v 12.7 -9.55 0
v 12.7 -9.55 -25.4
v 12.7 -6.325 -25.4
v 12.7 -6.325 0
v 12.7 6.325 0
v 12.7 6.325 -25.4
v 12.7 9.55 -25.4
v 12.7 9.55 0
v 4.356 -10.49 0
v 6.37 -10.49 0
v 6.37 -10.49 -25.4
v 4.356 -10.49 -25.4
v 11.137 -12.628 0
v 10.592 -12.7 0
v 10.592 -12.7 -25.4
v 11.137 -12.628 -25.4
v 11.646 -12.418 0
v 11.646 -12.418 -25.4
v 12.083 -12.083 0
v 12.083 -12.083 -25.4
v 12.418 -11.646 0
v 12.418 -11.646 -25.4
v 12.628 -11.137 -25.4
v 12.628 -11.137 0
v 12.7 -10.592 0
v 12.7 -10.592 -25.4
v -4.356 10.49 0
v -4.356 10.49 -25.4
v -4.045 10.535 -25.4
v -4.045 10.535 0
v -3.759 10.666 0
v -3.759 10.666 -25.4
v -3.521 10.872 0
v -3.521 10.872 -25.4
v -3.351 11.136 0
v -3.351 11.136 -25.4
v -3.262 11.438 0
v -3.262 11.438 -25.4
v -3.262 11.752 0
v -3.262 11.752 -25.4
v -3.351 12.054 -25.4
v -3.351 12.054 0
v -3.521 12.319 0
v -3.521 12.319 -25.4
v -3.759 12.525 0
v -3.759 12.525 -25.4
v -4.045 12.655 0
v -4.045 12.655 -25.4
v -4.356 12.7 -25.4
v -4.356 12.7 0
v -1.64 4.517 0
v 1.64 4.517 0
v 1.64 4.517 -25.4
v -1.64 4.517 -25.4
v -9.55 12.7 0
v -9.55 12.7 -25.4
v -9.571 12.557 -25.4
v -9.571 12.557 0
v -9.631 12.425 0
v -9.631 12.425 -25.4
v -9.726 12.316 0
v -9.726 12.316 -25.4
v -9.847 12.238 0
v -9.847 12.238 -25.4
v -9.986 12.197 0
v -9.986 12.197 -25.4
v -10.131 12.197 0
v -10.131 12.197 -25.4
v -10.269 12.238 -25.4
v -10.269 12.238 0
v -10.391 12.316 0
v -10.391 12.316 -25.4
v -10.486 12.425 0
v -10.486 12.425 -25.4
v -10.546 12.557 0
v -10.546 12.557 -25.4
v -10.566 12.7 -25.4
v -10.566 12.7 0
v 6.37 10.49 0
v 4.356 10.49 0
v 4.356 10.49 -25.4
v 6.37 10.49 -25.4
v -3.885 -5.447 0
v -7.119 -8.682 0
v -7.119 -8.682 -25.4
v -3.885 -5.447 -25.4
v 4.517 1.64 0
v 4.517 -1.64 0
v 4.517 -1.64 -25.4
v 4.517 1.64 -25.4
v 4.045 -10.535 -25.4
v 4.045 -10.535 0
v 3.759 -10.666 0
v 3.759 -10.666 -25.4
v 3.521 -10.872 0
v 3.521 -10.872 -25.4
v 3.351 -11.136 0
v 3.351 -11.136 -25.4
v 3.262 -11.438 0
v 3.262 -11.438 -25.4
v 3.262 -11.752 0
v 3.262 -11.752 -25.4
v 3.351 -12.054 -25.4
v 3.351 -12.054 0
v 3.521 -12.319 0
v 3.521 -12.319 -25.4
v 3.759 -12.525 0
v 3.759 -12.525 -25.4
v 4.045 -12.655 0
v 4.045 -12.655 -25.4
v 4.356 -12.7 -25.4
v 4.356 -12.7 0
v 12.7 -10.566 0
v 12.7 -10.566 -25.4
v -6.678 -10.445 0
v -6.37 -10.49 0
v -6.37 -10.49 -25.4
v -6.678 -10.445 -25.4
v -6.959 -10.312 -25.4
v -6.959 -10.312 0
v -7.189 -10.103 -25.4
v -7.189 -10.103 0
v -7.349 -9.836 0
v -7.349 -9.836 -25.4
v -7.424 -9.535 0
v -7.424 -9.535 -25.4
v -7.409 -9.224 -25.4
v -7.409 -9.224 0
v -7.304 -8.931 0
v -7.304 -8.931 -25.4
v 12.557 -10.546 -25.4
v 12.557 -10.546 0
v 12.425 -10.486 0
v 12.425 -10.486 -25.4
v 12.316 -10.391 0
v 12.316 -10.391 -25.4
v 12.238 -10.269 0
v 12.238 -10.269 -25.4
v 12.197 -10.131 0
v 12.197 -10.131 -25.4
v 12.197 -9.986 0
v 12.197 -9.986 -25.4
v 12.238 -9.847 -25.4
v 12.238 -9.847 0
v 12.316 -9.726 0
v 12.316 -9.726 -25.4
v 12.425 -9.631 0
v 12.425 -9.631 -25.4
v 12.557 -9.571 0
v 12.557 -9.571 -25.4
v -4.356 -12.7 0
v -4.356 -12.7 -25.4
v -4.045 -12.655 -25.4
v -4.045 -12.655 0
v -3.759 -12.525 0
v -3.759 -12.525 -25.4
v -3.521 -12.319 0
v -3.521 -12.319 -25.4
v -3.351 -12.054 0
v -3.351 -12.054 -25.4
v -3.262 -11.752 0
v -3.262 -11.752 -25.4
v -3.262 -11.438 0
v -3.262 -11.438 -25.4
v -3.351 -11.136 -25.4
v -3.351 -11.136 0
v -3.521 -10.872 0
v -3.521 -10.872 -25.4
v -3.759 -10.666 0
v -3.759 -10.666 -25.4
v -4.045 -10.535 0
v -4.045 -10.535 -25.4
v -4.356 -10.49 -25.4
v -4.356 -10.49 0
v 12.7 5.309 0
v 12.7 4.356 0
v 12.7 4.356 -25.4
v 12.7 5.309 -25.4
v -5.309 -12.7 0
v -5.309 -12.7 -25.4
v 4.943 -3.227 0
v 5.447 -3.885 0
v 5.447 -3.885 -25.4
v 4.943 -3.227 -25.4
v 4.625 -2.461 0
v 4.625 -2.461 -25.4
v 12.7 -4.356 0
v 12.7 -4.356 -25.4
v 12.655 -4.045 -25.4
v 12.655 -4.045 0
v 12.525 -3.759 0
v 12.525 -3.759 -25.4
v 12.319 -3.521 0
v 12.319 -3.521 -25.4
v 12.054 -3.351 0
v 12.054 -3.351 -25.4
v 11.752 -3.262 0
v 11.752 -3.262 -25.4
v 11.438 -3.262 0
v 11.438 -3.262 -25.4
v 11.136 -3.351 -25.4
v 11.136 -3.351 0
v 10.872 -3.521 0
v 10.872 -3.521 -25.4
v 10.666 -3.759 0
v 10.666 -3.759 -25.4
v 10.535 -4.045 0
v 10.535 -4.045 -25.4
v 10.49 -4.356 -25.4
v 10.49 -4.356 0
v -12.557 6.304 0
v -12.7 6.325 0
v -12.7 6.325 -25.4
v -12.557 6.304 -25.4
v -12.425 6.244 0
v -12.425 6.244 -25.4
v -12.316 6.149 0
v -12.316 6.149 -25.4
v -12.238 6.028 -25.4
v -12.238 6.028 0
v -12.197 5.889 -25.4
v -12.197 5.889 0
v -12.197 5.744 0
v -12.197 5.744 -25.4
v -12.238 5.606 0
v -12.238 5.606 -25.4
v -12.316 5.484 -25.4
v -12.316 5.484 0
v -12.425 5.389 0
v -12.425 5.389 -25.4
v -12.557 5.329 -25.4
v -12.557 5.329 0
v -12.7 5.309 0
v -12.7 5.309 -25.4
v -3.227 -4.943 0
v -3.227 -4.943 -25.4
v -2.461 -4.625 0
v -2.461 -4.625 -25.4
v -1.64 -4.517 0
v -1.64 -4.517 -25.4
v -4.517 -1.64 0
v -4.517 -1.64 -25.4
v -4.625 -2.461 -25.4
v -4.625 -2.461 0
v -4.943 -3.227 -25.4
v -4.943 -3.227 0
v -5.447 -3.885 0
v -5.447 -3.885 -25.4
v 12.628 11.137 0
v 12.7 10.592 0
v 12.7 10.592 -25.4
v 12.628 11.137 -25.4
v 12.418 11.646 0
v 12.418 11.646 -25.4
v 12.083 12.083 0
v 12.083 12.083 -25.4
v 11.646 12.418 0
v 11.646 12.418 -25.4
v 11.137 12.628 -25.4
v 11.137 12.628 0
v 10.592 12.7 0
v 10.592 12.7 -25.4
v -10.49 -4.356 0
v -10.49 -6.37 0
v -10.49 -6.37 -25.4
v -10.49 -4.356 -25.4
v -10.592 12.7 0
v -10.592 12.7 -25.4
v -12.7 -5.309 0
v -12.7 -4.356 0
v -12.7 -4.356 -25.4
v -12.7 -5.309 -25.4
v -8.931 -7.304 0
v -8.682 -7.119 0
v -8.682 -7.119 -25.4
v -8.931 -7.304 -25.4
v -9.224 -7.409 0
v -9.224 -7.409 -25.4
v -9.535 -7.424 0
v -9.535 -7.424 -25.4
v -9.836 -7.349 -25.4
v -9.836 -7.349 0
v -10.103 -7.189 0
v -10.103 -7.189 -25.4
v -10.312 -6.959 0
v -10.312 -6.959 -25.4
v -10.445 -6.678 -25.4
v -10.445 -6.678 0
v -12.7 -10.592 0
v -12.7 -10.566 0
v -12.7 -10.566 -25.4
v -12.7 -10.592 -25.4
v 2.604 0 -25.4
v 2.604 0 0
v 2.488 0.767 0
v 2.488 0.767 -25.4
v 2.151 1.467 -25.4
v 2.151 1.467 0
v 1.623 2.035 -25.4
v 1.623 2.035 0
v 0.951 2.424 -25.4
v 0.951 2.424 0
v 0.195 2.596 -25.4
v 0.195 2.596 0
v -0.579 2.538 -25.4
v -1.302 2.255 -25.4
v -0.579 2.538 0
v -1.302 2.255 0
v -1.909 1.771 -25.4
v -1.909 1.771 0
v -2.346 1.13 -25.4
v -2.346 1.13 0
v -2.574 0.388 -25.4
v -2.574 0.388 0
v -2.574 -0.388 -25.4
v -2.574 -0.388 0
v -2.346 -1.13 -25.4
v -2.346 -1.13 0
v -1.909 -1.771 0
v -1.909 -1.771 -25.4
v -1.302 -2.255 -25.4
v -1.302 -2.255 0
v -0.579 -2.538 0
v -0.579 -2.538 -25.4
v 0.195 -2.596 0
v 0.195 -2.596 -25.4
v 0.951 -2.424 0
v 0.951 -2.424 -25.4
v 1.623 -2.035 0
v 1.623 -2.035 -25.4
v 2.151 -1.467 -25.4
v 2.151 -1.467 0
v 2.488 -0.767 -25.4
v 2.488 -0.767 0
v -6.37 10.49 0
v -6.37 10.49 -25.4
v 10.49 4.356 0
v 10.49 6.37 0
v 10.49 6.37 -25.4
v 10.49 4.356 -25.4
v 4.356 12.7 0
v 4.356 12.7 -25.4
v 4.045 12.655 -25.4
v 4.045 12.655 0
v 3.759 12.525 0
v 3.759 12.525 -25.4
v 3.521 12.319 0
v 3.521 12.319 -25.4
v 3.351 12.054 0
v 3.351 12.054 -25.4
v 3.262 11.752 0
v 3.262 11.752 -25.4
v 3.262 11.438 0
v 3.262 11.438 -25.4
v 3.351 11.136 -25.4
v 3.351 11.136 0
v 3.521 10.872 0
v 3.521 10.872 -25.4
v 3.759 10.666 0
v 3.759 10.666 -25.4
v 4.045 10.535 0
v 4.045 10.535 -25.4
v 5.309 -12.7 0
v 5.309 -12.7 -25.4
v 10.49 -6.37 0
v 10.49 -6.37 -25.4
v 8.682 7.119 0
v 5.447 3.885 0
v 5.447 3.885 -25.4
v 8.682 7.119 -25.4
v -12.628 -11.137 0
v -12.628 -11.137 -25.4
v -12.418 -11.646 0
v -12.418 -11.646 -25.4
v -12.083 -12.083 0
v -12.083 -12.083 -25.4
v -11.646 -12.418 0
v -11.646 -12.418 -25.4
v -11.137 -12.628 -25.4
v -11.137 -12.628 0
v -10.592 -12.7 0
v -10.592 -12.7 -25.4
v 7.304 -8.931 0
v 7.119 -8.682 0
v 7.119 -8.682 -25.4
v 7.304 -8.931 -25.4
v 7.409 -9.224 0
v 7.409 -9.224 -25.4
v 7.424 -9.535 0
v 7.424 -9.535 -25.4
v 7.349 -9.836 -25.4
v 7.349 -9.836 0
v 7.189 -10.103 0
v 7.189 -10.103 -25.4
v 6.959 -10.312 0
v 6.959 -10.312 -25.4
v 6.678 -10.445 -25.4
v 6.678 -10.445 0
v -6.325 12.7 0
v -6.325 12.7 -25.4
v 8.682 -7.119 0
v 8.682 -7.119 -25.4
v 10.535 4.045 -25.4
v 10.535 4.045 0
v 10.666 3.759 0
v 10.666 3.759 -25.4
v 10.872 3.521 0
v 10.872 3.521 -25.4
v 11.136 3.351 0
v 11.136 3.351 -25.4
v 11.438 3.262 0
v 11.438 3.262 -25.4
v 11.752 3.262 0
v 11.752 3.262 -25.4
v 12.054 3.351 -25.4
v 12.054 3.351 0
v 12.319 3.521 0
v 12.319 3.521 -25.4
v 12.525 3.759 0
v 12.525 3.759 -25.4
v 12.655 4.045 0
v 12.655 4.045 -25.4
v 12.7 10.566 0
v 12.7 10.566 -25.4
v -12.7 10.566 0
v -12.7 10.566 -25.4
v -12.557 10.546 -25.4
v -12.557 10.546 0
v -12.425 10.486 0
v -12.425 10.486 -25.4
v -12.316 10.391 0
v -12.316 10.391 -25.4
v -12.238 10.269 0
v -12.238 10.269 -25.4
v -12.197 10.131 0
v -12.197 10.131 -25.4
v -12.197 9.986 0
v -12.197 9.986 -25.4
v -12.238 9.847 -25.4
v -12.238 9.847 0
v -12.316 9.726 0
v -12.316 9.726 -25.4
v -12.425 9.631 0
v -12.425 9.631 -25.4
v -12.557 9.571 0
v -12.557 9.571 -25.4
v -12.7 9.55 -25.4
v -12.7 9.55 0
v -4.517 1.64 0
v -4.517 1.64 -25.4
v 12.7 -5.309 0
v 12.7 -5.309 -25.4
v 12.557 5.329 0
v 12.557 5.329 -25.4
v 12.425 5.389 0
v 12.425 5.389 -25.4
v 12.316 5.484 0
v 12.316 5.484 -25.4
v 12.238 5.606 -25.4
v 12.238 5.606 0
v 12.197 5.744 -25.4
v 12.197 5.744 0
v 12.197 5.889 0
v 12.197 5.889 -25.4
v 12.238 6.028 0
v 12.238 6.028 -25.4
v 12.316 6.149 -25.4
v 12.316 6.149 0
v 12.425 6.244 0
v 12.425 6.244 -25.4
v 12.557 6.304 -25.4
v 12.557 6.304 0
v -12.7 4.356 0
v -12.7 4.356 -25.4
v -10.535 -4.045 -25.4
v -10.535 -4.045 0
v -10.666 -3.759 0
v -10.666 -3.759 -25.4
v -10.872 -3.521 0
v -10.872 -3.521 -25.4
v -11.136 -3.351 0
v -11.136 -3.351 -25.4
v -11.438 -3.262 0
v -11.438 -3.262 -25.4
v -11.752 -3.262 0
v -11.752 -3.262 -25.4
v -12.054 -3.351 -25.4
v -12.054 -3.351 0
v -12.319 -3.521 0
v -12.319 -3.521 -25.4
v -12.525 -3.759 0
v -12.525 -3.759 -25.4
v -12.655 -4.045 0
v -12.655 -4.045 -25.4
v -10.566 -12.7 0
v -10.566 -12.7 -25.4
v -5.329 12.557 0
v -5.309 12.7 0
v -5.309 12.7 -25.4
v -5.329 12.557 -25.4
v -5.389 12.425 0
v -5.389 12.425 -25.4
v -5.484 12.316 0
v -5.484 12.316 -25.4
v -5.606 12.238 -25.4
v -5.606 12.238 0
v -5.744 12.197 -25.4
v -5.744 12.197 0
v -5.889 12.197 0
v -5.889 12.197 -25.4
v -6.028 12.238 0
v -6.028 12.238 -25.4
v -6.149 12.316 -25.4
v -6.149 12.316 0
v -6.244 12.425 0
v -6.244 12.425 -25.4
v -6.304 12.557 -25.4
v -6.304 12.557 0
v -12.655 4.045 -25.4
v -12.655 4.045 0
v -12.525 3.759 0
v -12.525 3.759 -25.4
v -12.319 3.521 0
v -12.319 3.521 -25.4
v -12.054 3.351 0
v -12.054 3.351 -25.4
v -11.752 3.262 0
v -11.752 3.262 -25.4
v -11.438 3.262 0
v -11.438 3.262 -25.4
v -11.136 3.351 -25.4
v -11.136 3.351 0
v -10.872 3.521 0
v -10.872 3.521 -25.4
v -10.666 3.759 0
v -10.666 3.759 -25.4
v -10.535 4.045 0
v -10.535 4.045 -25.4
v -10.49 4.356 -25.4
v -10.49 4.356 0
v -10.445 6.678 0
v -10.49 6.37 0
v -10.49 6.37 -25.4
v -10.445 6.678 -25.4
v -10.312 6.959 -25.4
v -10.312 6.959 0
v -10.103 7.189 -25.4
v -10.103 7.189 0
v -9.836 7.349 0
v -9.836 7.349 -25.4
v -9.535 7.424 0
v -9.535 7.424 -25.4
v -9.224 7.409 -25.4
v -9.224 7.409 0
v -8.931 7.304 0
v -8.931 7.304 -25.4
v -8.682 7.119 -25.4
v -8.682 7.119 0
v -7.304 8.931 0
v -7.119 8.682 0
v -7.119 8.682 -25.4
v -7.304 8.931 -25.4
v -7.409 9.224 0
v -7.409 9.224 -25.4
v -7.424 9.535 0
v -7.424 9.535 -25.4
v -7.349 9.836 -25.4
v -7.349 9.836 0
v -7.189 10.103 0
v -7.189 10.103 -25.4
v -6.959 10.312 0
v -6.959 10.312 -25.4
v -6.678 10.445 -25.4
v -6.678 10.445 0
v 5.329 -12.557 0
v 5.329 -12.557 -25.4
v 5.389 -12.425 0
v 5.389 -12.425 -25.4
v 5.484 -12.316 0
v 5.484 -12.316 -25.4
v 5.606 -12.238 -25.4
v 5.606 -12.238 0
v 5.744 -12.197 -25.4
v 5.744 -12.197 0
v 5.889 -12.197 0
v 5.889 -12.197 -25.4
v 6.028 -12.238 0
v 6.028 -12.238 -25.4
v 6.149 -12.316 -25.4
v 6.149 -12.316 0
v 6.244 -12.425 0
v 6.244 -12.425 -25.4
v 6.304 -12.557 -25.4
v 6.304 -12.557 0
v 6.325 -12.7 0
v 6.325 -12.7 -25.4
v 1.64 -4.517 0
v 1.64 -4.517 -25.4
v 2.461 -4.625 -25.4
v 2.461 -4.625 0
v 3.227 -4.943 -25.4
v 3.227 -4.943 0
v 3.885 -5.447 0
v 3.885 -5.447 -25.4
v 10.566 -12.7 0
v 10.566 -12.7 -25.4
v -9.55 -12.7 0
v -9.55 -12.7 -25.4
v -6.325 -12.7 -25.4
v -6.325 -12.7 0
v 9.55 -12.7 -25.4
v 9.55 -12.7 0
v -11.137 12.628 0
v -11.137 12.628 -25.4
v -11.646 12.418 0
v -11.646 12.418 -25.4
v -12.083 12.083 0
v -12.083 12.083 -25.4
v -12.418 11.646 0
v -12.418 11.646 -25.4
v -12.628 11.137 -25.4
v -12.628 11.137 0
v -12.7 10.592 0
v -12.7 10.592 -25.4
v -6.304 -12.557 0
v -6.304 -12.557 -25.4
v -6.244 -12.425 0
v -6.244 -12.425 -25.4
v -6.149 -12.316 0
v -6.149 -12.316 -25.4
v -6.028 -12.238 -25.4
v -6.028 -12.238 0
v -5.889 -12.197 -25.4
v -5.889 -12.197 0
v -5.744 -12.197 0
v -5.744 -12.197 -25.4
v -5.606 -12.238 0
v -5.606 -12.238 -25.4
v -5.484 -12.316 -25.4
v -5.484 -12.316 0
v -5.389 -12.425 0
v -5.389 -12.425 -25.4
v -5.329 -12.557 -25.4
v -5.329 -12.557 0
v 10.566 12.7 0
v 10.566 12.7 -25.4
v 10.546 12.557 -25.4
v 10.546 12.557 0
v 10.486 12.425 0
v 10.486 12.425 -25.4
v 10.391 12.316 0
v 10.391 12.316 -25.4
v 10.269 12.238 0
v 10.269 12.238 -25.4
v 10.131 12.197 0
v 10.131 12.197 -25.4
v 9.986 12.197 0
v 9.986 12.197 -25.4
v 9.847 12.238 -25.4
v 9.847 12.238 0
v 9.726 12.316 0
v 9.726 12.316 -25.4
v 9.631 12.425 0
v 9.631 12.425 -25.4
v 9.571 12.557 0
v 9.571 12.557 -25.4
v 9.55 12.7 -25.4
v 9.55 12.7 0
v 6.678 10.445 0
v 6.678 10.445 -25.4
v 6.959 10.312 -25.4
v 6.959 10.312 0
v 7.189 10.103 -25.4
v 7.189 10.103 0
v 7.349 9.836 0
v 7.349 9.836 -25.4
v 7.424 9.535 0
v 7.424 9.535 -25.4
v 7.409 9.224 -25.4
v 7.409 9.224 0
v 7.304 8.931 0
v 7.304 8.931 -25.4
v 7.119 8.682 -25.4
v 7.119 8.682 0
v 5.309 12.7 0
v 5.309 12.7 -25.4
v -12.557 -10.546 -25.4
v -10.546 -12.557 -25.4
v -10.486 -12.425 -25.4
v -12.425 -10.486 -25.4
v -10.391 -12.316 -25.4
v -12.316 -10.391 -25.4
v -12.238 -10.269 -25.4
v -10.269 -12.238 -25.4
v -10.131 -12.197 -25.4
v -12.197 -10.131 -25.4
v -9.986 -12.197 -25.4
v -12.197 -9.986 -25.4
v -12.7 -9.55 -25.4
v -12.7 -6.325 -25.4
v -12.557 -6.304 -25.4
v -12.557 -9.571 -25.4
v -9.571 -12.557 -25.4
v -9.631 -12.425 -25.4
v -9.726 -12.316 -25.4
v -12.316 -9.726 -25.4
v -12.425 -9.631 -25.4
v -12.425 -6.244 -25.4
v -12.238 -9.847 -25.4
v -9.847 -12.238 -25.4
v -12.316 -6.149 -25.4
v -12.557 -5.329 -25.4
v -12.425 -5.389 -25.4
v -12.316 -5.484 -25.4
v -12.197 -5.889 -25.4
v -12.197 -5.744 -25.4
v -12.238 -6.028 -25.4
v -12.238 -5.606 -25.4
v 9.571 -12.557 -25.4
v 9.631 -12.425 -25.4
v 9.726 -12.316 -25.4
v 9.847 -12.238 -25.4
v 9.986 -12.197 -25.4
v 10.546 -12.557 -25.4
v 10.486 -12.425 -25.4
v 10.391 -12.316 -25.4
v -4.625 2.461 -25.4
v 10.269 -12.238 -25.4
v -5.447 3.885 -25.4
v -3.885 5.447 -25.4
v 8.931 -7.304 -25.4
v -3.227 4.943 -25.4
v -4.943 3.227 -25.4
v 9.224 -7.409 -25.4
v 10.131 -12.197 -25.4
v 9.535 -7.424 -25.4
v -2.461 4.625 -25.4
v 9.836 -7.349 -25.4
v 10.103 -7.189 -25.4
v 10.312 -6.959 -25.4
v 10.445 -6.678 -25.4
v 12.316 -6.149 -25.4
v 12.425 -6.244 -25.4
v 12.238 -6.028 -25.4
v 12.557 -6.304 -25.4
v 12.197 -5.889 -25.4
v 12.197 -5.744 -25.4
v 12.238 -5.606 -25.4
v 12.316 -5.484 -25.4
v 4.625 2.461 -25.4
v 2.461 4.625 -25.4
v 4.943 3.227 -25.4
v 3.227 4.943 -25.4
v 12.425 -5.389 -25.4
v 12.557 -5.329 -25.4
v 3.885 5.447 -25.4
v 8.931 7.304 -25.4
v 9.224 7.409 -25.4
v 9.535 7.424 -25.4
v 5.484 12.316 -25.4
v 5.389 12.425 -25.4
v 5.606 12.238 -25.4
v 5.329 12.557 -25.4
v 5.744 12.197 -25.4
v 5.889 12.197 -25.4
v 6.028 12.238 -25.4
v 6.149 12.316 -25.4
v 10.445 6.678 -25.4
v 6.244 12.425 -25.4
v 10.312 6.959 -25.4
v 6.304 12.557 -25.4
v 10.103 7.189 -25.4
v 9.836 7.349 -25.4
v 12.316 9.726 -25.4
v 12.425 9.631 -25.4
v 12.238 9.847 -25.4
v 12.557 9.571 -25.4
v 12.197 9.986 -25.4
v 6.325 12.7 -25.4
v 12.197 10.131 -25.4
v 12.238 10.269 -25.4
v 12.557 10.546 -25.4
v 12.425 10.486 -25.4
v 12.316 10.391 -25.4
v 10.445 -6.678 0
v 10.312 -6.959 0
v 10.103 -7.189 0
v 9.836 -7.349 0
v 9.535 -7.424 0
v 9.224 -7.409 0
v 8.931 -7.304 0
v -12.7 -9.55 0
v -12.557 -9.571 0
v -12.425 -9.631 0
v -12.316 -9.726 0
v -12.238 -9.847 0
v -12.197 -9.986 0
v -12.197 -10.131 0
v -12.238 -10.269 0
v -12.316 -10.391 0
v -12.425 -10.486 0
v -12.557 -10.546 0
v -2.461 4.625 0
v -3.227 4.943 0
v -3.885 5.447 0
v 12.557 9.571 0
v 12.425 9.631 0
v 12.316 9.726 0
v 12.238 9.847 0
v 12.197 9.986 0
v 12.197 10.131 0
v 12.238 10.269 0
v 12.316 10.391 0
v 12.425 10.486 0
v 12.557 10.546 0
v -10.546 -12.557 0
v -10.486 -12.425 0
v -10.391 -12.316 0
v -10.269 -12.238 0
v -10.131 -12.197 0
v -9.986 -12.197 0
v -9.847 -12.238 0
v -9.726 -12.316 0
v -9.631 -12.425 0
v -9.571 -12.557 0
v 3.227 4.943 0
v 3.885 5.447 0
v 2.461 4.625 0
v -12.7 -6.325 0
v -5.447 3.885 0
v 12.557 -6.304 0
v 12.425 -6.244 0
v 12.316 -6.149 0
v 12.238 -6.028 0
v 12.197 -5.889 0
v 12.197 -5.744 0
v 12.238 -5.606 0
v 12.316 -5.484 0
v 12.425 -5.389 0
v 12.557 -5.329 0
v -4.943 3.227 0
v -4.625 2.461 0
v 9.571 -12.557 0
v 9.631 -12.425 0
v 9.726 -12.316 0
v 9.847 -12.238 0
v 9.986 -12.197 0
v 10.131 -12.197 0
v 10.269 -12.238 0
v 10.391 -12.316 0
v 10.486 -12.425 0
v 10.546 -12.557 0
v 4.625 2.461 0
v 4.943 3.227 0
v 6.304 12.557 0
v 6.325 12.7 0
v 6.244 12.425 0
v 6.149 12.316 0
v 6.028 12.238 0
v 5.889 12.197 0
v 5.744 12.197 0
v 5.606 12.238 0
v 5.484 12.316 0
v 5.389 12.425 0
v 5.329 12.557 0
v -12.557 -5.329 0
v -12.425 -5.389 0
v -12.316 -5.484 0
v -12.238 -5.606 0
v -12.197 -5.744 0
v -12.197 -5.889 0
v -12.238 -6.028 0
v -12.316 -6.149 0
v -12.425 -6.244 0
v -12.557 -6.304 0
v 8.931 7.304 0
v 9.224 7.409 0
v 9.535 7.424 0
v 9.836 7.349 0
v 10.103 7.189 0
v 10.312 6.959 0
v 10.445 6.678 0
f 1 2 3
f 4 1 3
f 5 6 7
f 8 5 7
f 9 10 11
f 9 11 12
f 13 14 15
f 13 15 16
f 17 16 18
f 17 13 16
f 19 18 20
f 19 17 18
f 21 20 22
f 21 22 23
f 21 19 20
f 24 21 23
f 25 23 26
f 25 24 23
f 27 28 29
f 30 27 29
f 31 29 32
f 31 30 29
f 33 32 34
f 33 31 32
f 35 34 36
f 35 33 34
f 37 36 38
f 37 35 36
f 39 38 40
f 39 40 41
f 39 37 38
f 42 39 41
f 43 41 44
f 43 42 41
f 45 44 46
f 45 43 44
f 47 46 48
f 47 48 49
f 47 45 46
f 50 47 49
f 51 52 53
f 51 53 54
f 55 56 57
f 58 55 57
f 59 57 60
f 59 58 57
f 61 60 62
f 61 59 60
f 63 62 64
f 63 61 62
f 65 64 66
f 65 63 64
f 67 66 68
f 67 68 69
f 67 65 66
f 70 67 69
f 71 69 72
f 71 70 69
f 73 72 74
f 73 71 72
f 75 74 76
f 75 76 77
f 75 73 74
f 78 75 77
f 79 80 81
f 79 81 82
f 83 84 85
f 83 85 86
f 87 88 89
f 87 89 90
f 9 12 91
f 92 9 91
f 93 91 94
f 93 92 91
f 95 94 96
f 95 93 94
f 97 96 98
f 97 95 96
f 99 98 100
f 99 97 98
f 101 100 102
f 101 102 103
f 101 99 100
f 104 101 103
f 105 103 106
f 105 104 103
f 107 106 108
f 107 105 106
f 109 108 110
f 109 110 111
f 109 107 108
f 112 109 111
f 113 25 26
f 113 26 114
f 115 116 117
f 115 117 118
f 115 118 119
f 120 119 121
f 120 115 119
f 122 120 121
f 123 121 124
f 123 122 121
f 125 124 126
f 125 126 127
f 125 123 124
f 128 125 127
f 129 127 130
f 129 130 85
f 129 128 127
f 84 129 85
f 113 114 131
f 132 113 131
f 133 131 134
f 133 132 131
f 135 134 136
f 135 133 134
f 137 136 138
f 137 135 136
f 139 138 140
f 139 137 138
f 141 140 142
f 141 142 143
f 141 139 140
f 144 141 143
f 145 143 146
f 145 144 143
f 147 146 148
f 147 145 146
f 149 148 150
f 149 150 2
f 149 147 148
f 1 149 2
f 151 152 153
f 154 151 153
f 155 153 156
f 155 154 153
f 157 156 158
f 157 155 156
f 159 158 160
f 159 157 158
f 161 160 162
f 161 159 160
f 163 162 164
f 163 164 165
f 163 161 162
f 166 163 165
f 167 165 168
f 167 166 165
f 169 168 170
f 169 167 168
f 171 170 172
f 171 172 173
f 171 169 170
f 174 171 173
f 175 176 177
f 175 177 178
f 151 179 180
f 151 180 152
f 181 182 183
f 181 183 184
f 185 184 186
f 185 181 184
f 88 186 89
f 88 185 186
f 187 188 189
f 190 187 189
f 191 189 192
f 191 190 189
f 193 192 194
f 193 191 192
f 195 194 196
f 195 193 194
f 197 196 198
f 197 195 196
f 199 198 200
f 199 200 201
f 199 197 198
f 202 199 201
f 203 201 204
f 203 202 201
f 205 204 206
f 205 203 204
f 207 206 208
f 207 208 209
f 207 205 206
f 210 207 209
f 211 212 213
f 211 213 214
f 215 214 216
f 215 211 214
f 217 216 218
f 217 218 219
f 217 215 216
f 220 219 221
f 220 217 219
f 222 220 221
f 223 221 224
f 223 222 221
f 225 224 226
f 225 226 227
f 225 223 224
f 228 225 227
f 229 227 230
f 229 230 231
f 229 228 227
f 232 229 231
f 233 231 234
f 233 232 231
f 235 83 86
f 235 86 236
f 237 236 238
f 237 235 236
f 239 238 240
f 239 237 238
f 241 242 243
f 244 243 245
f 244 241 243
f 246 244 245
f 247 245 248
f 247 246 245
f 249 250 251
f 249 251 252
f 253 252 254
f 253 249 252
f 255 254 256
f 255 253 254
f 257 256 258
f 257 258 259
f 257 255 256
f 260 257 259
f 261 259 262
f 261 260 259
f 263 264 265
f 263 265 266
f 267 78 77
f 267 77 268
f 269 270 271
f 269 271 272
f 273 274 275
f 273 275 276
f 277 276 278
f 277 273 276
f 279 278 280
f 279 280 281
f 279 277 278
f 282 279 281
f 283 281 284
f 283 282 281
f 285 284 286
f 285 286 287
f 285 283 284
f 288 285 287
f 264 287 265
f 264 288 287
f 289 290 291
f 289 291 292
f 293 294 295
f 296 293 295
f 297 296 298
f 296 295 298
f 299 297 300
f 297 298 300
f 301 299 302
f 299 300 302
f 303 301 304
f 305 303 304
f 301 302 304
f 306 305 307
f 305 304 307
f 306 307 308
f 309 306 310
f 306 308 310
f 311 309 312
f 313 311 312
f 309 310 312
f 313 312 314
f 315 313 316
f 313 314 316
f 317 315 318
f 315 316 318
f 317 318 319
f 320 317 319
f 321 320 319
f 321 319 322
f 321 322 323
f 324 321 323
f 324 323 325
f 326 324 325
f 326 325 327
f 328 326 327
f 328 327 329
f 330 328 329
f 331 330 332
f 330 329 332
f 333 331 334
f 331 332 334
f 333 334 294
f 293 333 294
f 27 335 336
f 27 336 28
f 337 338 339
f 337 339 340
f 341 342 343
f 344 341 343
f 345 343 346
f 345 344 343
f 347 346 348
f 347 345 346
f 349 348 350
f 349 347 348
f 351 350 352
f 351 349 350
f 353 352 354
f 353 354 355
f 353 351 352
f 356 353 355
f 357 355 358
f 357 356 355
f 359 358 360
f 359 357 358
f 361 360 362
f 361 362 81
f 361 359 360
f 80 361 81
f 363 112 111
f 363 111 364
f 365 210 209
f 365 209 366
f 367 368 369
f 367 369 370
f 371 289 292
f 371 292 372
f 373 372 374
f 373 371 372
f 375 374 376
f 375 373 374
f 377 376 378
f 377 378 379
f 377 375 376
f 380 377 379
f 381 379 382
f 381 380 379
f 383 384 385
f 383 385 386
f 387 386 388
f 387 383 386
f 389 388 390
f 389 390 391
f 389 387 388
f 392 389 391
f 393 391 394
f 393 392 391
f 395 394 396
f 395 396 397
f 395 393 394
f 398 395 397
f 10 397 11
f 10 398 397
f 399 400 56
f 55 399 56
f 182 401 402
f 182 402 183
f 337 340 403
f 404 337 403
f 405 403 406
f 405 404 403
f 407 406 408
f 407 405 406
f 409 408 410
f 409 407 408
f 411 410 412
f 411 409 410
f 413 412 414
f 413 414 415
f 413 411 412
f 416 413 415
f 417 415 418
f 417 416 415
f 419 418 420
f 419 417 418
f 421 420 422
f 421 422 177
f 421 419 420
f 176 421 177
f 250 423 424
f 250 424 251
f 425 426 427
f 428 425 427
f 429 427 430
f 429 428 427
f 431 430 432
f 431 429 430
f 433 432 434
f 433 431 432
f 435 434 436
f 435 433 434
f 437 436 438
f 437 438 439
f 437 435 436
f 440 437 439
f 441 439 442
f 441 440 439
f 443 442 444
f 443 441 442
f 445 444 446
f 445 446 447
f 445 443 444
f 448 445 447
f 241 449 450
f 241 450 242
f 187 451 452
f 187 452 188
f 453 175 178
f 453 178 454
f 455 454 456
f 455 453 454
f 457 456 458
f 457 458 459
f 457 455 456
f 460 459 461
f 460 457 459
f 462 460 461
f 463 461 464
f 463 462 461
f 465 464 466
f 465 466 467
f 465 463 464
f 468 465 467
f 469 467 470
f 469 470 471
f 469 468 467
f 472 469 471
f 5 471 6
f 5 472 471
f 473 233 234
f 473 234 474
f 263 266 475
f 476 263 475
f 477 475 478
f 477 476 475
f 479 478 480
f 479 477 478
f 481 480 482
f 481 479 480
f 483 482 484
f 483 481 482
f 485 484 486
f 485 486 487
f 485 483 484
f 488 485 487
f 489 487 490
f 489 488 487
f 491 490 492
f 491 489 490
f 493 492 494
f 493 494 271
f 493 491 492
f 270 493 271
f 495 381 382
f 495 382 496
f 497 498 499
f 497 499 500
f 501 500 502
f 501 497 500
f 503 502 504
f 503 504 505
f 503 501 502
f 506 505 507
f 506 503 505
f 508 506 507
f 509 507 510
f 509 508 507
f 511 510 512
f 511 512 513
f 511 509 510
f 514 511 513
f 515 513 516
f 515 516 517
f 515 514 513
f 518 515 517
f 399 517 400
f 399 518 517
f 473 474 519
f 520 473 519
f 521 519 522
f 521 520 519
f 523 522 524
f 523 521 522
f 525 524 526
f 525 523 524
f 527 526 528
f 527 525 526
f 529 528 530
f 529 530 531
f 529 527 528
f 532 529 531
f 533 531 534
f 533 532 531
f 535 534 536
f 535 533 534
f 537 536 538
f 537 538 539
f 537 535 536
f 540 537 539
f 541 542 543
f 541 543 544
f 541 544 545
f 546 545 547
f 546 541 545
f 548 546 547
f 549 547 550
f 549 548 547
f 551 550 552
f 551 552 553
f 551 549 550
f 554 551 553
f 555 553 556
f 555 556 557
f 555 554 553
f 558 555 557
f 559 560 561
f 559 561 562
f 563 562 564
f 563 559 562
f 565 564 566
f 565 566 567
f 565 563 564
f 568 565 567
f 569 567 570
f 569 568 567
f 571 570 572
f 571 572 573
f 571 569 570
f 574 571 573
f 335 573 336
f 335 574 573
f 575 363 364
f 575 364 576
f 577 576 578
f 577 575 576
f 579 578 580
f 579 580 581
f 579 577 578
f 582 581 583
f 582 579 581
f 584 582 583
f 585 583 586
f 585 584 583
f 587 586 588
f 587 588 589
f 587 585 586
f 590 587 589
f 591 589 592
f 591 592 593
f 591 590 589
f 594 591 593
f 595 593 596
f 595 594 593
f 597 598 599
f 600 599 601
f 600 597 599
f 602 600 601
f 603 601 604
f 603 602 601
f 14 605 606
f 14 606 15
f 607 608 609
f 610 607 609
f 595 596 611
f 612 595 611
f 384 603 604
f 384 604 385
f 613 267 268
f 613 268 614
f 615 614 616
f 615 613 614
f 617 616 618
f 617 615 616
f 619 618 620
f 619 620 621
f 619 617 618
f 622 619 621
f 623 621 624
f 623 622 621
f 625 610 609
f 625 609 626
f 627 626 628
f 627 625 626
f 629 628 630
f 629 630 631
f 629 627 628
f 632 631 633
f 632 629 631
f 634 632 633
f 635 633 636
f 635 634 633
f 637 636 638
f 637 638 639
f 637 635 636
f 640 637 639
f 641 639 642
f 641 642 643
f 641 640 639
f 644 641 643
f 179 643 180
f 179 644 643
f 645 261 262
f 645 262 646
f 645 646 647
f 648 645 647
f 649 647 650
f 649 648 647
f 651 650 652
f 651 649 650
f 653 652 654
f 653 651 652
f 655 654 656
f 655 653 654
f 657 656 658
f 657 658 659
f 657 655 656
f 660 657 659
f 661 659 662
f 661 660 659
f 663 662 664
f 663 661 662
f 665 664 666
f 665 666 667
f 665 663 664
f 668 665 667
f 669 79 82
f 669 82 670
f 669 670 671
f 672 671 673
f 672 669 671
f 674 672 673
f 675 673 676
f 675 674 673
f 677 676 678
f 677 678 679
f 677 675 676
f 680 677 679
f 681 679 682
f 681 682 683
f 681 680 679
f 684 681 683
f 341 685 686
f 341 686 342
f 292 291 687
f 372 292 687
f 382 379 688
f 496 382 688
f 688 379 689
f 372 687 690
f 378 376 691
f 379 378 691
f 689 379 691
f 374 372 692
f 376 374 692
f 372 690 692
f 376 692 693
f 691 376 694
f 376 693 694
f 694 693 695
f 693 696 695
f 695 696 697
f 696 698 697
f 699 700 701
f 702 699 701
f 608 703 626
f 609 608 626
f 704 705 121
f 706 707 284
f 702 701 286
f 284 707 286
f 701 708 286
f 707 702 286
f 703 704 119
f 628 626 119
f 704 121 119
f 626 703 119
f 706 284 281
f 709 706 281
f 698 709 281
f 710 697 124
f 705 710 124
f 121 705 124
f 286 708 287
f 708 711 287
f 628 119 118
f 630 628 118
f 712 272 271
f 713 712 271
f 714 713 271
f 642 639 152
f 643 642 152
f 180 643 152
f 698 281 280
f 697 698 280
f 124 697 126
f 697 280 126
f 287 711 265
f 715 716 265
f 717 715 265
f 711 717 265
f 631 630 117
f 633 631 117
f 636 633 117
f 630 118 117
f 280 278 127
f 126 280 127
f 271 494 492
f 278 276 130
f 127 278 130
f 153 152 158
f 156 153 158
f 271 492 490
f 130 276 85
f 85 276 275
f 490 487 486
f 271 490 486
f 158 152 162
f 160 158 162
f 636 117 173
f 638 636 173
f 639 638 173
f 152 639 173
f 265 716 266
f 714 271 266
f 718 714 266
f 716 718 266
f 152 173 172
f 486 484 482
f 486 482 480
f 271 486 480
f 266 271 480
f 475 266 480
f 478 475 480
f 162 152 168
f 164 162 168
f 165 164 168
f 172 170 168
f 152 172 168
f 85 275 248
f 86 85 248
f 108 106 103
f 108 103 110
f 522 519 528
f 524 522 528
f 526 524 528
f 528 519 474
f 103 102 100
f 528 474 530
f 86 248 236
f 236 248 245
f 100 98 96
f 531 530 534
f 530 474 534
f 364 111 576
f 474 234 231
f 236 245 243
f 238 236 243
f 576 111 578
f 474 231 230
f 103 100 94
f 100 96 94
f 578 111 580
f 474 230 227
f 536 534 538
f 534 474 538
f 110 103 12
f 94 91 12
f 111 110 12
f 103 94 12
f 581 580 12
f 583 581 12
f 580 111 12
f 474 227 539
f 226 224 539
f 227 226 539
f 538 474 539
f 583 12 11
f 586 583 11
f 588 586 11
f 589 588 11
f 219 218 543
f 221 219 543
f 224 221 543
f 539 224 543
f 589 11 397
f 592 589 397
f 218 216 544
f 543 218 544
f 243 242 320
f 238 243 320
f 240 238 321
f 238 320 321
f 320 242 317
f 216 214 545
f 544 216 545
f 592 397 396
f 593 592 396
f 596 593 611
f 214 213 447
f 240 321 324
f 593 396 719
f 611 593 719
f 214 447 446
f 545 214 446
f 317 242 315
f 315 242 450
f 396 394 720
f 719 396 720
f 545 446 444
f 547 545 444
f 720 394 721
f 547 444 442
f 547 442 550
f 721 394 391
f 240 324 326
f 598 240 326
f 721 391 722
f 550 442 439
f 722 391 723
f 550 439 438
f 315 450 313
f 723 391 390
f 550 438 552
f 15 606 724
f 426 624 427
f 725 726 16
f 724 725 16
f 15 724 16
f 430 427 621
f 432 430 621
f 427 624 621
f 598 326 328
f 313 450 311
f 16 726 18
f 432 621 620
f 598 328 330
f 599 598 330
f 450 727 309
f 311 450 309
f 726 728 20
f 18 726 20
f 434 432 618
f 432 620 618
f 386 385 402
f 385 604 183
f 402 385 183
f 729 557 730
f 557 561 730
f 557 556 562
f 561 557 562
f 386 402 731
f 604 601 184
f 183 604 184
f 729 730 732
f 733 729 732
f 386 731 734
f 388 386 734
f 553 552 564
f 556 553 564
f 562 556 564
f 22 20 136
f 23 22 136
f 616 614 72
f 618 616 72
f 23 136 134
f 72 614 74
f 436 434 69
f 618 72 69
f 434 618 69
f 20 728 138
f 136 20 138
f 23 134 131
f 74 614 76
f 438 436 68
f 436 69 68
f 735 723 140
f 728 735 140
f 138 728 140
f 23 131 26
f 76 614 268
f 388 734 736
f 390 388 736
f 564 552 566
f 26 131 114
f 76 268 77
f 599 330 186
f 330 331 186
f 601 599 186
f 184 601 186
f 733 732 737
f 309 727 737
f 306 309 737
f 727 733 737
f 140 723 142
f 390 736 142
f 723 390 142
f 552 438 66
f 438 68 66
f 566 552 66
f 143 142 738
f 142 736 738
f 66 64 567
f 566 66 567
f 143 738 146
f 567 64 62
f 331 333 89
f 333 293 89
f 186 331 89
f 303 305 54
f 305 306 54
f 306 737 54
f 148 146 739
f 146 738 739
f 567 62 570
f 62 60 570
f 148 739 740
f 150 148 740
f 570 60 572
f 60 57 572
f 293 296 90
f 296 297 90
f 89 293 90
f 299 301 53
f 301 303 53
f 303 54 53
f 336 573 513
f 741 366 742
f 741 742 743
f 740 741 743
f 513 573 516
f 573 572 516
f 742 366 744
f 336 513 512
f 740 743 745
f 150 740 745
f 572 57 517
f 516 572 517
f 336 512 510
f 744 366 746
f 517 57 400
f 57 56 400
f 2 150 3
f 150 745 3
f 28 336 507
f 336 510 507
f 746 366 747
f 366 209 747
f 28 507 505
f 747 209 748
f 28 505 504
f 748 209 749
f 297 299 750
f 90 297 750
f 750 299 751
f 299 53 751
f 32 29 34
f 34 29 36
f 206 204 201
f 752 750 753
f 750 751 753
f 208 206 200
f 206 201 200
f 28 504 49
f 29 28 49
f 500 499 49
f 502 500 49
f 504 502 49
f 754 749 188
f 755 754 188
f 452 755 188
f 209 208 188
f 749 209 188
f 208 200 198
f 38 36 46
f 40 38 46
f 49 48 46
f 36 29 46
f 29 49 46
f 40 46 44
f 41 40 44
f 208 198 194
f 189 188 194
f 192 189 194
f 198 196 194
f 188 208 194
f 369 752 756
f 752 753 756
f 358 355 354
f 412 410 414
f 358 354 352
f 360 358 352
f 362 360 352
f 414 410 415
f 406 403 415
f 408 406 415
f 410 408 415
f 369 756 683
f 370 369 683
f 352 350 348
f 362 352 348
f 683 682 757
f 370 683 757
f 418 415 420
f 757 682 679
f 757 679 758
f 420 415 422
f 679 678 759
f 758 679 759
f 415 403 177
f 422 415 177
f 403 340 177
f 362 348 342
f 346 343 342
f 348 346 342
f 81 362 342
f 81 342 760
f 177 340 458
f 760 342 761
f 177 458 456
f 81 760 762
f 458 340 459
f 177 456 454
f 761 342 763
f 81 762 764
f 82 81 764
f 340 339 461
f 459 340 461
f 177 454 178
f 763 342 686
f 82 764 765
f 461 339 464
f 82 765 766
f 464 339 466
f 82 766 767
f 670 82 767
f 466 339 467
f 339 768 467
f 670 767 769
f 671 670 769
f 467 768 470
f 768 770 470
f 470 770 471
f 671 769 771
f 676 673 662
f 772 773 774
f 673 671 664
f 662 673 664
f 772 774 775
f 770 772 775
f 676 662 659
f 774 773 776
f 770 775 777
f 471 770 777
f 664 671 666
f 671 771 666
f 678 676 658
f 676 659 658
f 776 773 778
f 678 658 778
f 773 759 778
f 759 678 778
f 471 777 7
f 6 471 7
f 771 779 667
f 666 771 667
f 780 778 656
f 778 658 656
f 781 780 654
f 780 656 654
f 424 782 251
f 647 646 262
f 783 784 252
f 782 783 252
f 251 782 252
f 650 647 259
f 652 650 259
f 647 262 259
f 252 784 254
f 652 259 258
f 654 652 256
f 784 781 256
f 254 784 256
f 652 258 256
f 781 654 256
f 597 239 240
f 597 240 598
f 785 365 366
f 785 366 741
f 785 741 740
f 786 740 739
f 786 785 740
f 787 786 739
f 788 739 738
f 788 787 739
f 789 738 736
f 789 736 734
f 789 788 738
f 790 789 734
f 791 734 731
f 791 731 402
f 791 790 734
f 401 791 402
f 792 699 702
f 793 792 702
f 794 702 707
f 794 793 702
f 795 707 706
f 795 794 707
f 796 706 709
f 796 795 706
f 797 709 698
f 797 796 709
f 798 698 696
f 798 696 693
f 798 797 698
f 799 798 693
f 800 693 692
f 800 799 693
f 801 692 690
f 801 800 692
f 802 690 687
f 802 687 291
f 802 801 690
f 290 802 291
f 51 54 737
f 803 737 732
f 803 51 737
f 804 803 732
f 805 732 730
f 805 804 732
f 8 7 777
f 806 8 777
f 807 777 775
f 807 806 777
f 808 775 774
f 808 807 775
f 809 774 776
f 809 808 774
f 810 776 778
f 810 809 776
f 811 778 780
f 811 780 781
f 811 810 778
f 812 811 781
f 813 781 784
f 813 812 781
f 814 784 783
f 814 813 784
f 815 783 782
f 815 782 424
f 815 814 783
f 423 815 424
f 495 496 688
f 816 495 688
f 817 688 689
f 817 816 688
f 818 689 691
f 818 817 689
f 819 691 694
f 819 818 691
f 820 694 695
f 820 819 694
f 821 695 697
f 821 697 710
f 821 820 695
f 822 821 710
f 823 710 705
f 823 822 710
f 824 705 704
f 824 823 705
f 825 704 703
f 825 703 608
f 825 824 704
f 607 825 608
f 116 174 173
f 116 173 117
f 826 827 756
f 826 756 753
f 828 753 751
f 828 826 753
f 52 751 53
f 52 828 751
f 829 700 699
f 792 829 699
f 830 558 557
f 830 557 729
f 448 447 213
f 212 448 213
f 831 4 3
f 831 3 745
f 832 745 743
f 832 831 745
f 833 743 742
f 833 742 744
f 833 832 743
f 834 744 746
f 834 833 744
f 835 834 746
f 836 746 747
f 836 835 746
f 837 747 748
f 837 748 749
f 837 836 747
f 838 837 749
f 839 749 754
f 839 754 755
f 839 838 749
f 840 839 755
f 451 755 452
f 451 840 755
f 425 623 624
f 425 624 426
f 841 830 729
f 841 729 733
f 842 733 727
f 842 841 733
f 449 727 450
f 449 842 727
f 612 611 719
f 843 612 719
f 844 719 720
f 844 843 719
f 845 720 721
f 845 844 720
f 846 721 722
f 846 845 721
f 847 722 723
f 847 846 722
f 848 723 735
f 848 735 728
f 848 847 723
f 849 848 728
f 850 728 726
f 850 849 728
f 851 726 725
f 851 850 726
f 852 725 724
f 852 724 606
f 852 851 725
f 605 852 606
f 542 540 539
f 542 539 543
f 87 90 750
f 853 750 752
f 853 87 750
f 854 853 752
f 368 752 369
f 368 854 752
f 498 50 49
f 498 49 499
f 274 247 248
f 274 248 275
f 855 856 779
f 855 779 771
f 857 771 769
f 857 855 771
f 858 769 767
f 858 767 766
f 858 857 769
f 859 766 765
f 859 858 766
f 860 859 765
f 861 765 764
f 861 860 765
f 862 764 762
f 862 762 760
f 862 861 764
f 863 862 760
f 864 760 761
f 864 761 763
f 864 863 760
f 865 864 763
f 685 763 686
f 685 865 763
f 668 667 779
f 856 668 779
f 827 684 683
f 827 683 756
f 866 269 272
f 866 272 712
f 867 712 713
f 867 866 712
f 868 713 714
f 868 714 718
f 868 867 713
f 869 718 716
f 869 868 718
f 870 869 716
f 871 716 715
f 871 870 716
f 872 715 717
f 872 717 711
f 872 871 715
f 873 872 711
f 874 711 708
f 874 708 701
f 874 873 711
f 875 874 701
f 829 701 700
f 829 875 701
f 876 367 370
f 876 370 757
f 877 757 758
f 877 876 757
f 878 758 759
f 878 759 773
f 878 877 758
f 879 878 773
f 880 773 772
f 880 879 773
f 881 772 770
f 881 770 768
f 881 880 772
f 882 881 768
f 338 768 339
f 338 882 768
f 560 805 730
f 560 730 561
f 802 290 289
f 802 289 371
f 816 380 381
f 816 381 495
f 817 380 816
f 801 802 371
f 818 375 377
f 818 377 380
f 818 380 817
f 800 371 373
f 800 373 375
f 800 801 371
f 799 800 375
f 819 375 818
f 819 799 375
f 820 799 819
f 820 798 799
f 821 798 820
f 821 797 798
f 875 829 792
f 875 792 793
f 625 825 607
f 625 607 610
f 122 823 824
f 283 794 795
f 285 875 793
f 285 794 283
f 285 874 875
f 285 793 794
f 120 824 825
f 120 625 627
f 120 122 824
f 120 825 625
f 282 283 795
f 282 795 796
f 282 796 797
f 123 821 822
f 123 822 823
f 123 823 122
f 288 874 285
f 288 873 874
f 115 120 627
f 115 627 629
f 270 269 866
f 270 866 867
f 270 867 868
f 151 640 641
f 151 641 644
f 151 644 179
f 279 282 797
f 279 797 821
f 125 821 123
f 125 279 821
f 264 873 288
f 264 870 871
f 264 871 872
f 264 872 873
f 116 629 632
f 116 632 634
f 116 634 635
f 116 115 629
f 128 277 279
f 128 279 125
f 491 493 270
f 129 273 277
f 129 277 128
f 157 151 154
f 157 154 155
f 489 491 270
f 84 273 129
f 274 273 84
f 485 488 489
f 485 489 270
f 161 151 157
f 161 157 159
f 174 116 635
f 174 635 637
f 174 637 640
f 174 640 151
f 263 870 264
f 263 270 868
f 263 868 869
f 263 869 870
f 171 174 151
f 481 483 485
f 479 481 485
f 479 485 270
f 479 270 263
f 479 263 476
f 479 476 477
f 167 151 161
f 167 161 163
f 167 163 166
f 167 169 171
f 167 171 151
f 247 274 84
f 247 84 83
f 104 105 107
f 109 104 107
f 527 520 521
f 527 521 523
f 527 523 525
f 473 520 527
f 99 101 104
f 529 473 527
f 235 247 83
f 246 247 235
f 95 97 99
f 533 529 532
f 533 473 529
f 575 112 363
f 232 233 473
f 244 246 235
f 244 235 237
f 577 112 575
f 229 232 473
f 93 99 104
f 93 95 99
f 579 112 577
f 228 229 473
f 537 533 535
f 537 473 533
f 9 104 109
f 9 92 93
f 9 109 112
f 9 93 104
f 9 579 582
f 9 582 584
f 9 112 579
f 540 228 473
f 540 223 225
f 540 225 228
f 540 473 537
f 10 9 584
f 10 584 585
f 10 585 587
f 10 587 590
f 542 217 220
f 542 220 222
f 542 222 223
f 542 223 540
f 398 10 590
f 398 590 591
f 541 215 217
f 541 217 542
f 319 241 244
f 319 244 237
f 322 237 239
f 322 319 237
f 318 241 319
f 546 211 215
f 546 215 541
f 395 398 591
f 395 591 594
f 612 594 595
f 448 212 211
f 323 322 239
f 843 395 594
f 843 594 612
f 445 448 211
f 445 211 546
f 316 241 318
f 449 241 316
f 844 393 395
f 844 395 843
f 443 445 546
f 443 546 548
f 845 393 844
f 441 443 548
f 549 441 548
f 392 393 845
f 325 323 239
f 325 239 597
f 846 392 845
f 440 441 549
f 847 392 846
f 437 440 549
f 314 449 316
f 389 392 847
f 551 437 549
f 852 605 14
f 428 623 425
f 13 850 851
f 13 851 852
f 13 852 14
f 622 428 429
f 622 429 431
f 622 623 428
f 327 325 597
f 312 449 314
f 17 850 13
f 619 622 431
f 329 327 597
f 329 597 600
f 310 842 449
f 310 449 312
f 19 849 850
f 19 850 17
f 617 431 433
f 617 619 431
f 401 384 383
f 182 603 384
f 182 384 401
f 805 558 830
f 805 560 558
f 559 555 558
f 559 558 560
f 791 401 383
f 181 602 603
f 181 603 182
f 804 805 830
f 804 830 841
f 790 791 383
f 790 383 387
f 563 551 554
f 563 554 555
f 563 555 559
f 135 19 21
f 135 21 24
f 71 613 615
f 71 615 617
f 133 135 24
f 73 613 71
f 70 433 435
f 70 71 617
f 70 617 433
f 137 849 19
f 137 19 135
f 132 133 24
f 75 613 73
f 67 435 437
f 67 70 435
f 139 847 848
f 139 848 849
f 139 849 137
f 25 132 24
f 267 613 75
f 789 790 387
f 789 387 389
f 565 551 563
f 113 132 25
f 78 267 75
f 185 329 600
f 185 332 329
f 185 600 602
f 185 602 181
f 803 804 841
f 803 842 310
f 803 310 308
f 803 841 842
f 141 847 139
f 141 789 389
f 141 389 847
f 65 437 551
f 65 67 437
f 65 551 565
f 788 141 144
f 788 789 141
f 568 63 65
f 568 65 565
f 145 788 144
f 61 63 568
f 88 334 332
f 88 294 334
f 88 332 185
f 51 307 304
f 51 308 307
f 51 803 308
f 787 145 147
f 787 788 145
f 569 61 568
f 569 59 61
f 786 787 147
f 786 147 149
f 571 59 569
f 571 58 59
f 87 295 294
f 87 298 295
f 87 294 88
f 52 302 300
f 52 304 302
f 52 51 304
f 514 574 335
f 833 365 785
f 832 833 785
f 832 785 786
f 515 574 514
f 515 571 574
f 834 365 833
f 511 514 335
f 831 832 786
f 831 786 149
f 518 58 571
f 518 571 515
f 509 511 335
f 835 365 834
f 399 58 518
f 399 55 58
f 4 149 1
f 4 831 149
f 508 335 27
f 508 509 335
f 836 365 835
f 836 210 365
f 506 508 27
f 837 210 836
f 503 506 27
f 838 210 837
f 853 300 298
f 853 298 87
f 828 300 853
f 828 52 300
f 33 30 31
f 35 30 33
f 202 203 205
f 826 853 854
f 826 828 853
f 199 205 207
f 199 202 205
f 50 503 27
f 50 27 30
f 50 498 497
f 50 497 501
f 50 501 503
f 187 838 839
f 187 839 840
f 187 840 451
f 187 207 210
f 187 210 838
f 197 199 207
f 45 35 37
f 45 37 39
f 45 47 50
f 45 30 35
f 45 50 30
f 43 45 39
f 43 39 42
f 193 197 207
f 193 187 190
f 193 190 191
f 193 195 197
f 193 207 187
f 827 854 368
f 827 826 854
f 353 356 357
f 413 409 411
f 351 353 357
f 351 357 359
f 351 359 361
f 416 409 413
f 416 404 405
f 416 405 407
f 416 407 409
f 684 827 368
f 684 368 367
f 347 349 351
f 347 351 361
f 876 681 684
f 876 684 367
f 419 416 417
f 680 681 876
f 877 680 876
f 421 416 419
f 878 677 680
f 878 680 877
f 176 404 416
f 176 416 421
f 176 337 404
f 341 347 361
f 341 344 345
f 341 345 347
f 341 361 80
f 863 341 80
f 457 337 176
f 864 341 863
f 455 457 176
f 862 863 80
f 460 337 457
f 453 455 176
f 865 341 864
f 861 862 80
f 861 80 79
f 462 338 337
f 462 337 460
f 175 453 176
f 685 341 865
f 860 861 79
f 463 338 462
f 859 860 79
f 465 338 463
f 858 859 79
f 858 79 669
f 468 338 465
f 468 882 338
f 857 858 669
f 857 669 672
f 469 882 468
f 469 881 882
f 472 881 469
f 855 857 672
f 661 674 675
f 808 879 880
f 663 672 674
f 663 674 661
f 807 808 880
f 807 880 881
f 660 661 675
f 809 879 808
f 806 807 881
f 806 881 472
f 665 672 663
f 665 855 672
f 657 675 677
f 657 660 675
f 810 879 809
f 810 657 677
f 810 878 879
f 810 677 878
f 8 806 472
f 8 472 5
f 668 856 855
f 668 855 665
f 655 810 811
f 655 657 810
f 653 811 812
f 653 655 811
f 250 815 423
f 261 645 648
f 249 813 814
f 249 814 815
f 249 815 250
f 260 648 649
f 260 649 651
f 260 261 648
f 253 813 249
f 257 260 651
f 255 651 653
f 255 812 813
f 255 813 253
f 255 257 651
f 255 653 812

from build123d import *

# Parameters (mm, degrees)
SKETCH1_R      = 2.6035
EXTRUDE1_DEPTH = 25.4


with BuildPart() as part:
    # Sketch1 → Extrude1 (new body)
    with BuildSketch(Plane.XY):
        with BuildLine():
            Line((10.5918, 12.7), (10.5664, 12.7))
            ThreePointArc((10.5664, 12.7), (10.0584, 12.192), (9.5504, 12.7))
            Line((9.5504, 12.7), (6.3246, 12.7))
            ThreePointArc((6.3246, 12.7), (5.8166, 12.192), (5.3086, 12.7))
            Line((5.3086, 12.7), (4.3561, 12.7))
            ThreePointArc((4.3561, 12.7), (3.2512, 11.5951), (4.3561, 10.4902))
            Line((4.3561, 10.4902), (6.370083786, 10.4902))
            ThreePointArc((6.370083786, 10.4902), (7.348856743, 9.836204819), (7.119204175, 8.681663397))
            Line((7.119204175, 8.681663397), (3.88464389, 5.447103113))
            ThreePointArc((3.88464389, 5.447103113), (2.854599758, 4.758849627), (1.63957986, 4.517167143))
            Line((1.63957986, 4.517167143), (-1.63957986, 4.517167143))
            ThreePointArc((-1.63957986, 4.517167143), (-2.854599758, 4.758849627), (-3.88464389, 5.447103113))
            Line((-3.88464389, 5.447103113), (-7.119204175, 8.681663397))
            ThreePointArc((-7.119204175, 8.681663397), (-7.348856743, 9.836204819), (-6.370083786, 10.4902))
            Line((-6.370083786, 10.4902), (-4.3561, 10.4902))
            ThreePointArc((-4.3561, 10.4902), (-3.2512, 11.5951), (-4.3561, 12.7))
            Line((-4.3561, 12.7), (-5.3086, 12.7))
            ThreePointArc((-5.3086, 12.7), (-5.8166, 12.192), (-6.3246, 12.7))
            Line((-6.3246, 12.7), (-9.5504, 12.7))
            ThreePointArc((-9.5504, 12.7), (-10.0584, 12.192), (-10.5664, 12.7))
            Line((-10.5664, 12.7), (-10.5918, 12.7))
            ThreePointArc((-10.5918, 12.7), (-12.082522516, 12.082522516), (-12.7, 10.5918))
            Line((-12.7, 10.5918), (-12.7, 10.5664))
            ThreePointArc((-12.7, 10.5664), (-12.192, 10.0584), (-12.7, 9.5504))
            Line((-12.7, 9.5504), (-12.7, 6.3246))
            ThreePointArc((-12.7, 6.3246), (-12.192, 5.8166), (-12.7, 5.3086))
            Line((-12.7, 5.3086), (-12.7, 4.3561))
            ThreePointArc((-12.7, 4.3561), (-11.5951, 3.2512), (-10.4902, 4.3561))
            Line((-10.4902, 4.3561), (-10.4902, 6.370083786))
            ThreePointArc((-10.4902, 6.370083786), (-9.836204819, 7.348856743), (-8.681663397, 7.119204175))
            Line((-8.681663397, 7.119204175), (-5.447103113, 3.88464389))
            ThreePointArc((-5.447103113, 3.88464389), (-4.758849627, 2.854599758), (-4.517167143, 1.63957986))
            Line((-4.517167143, 1.63957986), (-4.517167143, -1.63957986))
            ThreePointArc((-4.517167143, -1.63957986), (-4.758849627, -2.854599758), (-5.447103113, -3.88464389))
            Line((-5.447103113, -3.88464389), (-8.681663397, -7.119204175))
            ThreePointArc((-8.681663397, -7.119204175), (-9.836204819, -7.348856743), (-10.4902, -6.370083786))
            Line((-10.4902, -6.370083786), (-10.4902, -4.3561))
            ThreePointArc((-10.4902, -4.3561), (-11.5951, -3.2512), (-12.7, -4.3561))
            Line((-12.7, -4.3561), (-12.7, -5.3086))
            ThreePointArc((-12.7, -5.3086), (-12.192, -5.8166), (-12.7, -6.3246))
            Line((-12.7, -6.3246), (-12.7, -9.5504))
            ThreePointArc((-12.7, -9.5504), (-12.192, -10.0584), (-12.7, -10.5664))
            Line((-12.7, -10.5664), (-12.7, -10.5918))
            ThreePointArc((-12.7, -10.5918), (-12.082522516, -12.082522516), (-10.5918, -12.7))
            Line((-10.5918, -12.7), (-10.5664, -12.7))
            ThreePointArc((-10.5664, -12.7), (-10.0584, -12.192), (-9.5504, -12.7))
            Line((-9.5504, -12.7), (-6.3246, -12.7))
            ThreePointArc((-6.3246, -12.7), (-5.8166, -12.192), (-5.3086, -12.7))
            Line((-5.3086, -12.7), (-4.3561, -12.7))
            ThreePointArc((-4.3561, -12.7), (-3.2512, -11.5951), (-4.3561, -10.4902))
            Line((-4.3561, -10.4902), (-6.370083786, -10.4902))
            ThreePointArc((-6.370083786, -10.4902), (-7.348856743, -9.836204819), (-7.119204175, -8.681663397))
            Line((-7.119204175, -8.681663397), (-3.88464389, -5.447103113))
            ThreePointArc((-3.88464389, -5.447103113), (-2.854599758, -4.758849627), (-1.63957986, -4.517167143))
            Line((-1.63957986, -4.517167143), (1.63957986, -4.517167143))
            ThreePointArc((1.63957986, -4.517167143), (2.854599758, -4.758849627), (3.88464389, -5.447103113))
            Line((3.88464389, -5.447103113), (7.119204175, -8.681663397))
            ThreePointArc((7.119204175, -8.681663397), (7.348856743, -9.836204819), (6.370083786, -10.4902))
            Line((6.370083786, -10.4902), (4.3561, -10.4902))
            ThreePointArc((4.3561, -10.4902), (3.2512, -11.5951), (4.3561, -12.7))
            Line((4.3561, -12.7), (5.3086, -12.7))
            ThreePointArc((5.3086, -12.7), (5.8166, -12.192), (6.3246, -12.7))
            Line((6.3246, -12.7), (9.5504, -12.7))
            ThreePointArc((9.5504, -12.7), (10.0584, -12.192), (10.5664, -12.7))
            Line((10.5664, -12.7), (10.5918, -12.7))
            ThreePointArc((10.5918, -12.7), (12.082522516, -12.082522516), (12.7, -10.5918))
            Line((12.7, -10.5918), (12.7, -10.5664))
            ThreePointArc((12.7, -10.5664), (12.192, -10.0584), (12.7, -9.5504))
            Line((12.7, -9.5504), (12.7, -6.3246))
            ThreePointArc((12.7, -6.3246), (12.192, -5.8166), (12.7, -5.3086))
            Line((12.7, -5.3086), (12.7, -4.3561))
            ThreePointArc((12.7, -4.3561), (11.5951, -3.2512), (10.4902, -4.3561))
            Line((10.4902, -4.3561), (10.4902, -6.370083786))
            ThreePointArc((10.4902, -6.370083786), (9.836204819, -7.348856743), (8.681663397, -7.119204175))
            Line((8.681663397, -7.119204175), (5.447103113, -3.88464389))
            ThreePointArc((5.447103113, -3.88464389), (4.758849627, -2.854599758), (4.517167143, -1.63957986))
            Line((4.517167143, -1.63957986), (4.517167143, 1.63957986))
            ThreePointArc((4.517167143, 1.63957986), (4.758849627, 2.854599758), (5.447103113, 3.88464389))
            Line((5.447103113, 3.88464389), (8.681663397, 7.119204175))
            ThreePointArc((8.681663397, 7.119204175), (9.836204819, 7.348856743), (10.4902, 6.370083786))
            Line((10.4902, 6.370083786), (10.4902, 4.3561))
            ThreePointArc((10.4902, 4.3561), (11.5951, 3.2512), (12.7, 4.3561))
            Line((12.7, 4.3561), (12.7, 5.3086))
            ThreePointArc((12.7, 5.3086), (12.192, 5.8166), (12.7, 6.3246))
            Line((12.7, 6.3246), (12.7, 9.5504))
            ThreePointArc((12.7, 9.5504), (12.192, 10.0584), (12.7, 10.5664))
            Line((12.7, 10.5664), (12.7, 10.5918))
            ThreePointArc((12.7, 10.5918), (12.082522516, 12.082522516), (10.5918, 12.7))
        make_face()
        Circle(SKETCH1_R, mode=Mode.SUBTRACT)
    extrude(amount=-EXTRUDE1_DEPTH)


solid = part.part
